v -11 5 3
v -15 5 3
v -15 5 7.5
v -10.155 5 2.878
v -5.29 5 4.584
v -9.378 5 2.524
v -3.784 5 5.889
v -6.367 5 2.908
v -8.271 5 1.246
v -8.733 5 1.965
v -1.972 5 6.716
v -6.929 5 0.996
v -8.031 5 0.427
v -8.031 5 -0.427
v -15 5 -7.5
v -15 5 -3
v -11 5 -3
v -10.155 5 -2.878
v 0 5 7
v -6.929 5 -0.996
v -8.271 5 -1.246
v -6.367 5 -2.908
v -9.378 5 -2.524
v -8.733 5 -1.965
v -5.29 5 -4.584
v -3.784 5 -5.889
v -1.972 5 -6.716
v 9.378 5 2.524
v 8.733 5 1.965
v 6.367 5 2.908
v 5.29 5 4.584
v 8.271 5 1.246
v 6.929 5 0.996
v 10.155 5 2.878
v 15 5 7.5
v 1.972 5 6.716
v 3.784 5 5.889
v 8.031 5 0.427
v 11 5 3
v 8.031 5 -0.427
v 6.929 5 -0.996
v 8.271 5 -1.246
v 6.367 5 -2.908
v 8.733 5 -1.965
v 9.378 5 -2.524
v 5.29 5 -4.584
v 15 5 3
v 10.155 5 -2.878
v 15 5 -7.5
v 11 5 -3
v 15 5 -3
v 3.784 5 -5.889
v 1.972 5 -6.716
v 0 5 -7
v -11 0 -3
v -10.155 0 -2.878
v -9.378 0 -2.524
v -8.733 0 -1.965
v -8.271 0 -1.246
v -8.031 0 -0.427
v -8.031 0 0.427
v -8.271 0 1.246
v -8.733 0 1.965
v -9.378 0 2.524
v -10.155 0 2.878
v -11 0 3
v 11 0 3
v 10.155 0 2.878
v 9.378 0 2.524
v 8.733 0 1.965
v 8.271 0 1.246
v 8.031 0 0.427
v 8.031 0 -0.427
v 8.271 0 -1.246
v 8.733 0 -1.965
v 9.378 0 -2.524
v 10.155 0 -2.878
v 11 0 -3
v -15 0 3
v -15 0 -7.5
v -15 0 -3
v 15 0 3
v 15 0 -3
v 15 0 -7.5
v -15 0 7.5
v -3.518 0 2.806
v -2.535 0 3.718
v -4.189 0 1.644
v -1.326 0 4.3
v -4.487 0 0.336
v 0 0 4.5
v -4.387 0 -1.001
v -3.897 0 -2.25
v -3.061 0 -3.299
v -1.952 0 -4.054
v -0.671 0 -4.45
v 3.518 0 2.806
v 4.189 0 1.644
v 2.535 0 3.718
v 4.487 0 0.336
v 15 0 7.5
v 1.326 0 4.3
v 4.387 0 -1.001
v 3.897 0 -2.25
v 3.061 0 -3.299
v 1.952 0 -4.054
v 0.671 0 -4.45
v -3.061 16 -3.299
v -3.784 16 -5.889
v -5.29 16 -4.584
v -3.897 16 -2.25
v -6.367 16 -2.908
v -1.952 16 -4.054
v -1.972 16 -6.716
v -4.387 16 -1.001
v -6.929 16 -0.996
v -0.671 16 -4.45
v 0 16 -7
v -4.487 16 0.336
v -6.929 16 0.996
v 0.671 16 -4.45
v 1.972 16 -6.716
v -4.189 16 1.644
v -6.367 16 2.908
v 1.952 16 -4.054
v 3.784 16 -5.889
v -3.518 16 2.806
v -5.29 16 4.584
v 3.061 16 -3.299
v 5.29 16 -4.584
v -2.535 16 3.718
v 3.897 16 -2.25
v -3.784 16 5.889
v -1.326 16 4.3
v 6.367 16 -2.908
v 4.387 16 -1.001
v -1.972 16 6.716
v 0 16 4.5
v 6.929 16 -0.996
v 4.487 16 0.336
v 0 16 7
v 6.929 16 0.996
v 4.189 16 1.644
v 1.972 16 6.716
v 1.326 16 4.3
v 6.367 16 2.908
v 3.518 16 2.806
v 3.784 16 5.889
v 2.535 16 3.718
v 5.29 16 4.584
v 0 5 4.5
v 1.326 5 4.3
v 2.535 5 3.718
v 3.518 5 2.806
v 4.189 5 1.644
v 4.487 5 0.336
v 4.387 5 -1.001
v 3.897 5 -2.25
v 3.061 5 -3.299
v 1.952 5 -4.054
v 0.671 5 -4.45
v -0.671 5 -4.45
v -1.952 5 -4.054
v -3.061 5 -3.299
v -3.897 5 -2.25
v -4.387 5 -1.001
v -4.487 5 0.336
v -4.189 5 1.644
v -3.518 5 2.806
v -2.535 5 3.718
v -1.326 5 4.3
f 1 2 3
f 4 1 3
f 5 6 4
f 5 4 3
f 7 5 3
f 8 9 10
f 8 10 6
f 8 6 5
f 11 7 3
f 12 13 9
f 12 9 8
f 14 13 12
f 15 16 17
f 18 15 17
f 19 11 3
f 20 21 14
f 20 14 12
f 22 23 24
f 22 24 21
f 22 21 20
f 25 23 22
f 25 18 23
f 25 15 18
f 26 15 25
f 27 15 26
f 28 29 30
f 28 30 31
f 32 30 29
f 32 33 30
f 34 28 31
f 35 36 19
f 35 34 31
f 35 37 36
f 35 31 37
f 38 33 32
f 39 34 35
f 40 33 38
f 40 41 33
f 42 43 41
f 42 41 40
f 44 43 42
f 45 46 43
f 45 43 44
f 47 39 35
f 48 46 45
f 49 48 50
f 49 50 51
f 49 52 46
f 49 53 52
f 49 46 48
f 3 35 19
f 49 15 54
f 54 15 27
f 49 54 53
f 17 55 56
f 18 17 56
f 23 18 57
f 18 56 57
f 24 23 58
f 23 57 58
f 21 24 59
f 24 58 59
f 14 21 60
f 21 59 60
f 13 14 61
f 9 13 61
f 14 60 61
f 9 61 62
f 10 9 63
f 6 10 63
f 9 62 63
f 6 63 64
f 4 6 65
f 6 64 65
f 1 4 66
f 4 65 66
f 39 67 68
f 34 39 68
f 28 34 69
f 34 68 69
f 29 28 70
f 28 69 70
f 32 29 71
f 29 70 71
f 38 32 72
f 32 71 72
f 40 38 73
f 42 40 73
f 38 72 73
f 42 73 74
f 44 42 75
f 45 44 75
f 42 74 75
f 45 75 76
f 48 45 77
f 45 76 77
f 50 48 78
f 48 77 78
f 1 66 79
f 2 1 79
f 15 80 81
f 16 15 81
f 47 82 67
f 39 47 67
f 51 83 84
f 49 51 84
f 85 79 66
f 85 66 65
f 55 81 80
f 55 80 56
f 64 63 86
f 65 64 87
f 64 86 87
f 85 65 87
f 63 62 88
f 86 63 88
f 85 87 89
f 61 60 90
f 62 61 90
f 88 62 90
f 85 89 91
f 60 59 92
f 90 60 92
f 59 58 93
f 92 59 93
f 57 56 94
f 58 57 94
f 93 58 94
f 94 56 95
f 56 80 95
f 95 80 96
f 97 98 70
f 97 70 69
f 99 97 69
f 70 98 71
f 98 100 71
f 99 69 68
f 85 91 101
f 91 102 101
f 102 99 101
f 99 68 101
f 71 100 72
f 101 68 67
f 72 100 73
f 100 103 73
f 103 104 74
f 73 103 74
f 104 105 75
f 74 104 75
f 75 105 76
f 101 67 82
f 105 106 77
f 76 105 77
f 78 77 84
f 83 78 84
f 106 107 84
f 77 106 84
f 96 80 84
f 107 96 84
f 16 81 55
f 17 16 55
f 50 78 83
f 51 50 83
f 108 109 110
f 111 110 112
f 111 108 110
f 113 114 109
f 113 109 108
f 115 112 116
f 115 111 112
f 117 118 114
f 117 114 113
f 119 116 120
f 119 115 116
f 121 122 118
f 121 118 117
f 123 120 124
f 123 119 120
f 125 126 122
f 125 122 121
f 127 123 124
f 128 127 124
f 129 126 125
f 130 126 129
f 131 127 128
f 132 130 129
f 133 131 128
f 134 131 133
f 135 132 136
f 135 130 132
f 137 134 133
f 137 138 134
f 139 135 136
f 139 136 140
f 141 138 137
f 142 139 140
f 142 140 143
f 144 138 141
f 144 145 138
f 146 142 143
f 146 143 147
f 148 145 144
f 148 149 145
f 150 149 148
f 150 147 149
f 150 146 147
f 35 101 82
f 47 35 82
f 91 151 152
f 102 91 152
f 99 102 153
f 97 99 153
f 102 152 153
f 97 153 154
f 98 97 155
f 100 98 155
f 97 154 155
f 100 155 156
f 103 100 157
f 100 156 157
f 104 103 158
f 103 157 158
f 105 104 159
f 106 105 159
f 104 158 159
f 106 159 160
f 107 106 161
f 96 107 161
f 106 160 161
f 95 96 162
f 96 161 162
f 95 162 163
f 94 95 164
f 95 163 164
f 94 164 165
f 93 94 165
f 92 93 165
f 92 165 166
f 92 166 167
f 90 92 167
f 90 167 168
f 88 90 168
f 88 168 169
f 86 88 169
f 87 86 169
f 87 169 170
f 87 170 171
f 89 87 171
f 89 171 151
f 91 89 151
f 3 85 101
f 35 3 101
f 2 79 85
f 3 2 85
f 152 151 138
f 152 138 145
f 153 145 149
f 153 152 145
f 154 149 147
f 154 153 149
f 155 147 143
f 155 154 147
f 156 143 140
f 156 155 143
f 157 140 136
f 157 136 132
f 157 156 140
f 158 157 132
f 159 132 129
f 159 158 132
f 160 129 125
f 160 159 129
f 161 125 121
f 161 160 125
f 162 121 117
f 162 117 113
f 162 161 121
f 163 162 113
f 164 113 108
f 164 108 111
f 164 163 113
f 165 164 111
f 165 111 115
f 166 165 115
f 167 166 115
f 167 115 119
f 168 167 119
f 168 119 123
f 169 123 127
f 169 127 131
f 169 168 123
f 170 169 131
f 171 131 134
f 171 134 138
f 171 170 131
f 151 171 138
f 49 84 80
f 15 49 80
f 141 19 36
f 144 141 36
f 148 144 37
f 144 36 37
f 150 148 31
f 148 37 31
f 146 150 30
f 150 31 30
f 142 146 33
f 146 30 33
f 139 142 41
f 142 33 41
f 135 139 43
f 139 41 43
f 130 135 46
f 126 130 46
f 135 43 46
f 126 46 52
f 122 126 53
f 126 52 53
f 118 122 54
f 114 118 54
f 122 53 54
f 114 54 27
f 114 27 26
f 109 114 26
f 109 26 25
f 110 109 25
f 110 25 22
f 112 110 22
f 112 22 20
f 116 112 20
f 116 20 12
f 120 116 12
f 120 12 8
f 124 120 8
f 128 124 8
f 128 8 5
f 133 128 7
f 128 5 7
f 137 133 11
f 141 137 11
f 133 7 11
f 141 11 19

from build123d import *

# Parameters (mm, degrees)
EXTRUDE_1_DEPTH     = 5
SKETCH_3_R          = 7
SKETCH_3_R_2        = 4.5
EXTRUDE_2_DEPTH     = 11
SKETCH_3_3_R        = 4.5
CUT_EXTRUDE_1_DEPTH = 21.05617112


with BuildPart() as part:
    # 草图2 → 凸台-拉伸1 (new body)
    with BuildSketch(Plane(origin=(0, 0, 0), x_dir=(1, 0, 0), z_dir=(0, 1, 0))):
        with BuildLine():
            Line((-15, -7.5), (15, -7.5))
            Line((15, -7.5), (15, -3))
            Line((15, -3), (11, -3))
            ThreePointArc((11, -3), (8, 0), (11, 3))
            Line((11, 3), (15, 3))
            Line((15, 3), (15, 7.5))
            Line((15, 7.5), (-15, 7.5))
            Line((-15, 7.5), (-15, 3))
            Line((-15, 3), (-11, 3))
            ThreePointArc((-11, 3), (-8, 0), (-11, -3))
            Line((-11, -3), (-15, -3))
            Line((-15, -3), (-15, -7.5))
        make_face()
    extrude(amount=EXTRUDE_1_DEPTH)

    # 草图3 → 凸台-拉伸2 (add)
    with BuildSketch(Plane(origin=(0, 5, 0), x_dir=(1, 0, 0), z_dir=(0, 1, 0))):
        Circle(SKETCH_3_R)
        Circle(SKETCH_3_R_2, mode=Mode.SUBTRACT)
    extrude(amount=EXTRUDE_2_DEPTH)

    # 草图3<3> → 切除-拉伸1 (cut, through all)
    with BuildSketch(Plane(origin=(0, 5, 0), x_dir=(1, 0, 0), z_dir=(0, 1, 0))):
        Circle(SKETCH_3_3_R)
    extrude(amount=-CUT_EXTRUDE_1_DEPTH, mode=Mode.SUBTRACT)


solid = part.part
